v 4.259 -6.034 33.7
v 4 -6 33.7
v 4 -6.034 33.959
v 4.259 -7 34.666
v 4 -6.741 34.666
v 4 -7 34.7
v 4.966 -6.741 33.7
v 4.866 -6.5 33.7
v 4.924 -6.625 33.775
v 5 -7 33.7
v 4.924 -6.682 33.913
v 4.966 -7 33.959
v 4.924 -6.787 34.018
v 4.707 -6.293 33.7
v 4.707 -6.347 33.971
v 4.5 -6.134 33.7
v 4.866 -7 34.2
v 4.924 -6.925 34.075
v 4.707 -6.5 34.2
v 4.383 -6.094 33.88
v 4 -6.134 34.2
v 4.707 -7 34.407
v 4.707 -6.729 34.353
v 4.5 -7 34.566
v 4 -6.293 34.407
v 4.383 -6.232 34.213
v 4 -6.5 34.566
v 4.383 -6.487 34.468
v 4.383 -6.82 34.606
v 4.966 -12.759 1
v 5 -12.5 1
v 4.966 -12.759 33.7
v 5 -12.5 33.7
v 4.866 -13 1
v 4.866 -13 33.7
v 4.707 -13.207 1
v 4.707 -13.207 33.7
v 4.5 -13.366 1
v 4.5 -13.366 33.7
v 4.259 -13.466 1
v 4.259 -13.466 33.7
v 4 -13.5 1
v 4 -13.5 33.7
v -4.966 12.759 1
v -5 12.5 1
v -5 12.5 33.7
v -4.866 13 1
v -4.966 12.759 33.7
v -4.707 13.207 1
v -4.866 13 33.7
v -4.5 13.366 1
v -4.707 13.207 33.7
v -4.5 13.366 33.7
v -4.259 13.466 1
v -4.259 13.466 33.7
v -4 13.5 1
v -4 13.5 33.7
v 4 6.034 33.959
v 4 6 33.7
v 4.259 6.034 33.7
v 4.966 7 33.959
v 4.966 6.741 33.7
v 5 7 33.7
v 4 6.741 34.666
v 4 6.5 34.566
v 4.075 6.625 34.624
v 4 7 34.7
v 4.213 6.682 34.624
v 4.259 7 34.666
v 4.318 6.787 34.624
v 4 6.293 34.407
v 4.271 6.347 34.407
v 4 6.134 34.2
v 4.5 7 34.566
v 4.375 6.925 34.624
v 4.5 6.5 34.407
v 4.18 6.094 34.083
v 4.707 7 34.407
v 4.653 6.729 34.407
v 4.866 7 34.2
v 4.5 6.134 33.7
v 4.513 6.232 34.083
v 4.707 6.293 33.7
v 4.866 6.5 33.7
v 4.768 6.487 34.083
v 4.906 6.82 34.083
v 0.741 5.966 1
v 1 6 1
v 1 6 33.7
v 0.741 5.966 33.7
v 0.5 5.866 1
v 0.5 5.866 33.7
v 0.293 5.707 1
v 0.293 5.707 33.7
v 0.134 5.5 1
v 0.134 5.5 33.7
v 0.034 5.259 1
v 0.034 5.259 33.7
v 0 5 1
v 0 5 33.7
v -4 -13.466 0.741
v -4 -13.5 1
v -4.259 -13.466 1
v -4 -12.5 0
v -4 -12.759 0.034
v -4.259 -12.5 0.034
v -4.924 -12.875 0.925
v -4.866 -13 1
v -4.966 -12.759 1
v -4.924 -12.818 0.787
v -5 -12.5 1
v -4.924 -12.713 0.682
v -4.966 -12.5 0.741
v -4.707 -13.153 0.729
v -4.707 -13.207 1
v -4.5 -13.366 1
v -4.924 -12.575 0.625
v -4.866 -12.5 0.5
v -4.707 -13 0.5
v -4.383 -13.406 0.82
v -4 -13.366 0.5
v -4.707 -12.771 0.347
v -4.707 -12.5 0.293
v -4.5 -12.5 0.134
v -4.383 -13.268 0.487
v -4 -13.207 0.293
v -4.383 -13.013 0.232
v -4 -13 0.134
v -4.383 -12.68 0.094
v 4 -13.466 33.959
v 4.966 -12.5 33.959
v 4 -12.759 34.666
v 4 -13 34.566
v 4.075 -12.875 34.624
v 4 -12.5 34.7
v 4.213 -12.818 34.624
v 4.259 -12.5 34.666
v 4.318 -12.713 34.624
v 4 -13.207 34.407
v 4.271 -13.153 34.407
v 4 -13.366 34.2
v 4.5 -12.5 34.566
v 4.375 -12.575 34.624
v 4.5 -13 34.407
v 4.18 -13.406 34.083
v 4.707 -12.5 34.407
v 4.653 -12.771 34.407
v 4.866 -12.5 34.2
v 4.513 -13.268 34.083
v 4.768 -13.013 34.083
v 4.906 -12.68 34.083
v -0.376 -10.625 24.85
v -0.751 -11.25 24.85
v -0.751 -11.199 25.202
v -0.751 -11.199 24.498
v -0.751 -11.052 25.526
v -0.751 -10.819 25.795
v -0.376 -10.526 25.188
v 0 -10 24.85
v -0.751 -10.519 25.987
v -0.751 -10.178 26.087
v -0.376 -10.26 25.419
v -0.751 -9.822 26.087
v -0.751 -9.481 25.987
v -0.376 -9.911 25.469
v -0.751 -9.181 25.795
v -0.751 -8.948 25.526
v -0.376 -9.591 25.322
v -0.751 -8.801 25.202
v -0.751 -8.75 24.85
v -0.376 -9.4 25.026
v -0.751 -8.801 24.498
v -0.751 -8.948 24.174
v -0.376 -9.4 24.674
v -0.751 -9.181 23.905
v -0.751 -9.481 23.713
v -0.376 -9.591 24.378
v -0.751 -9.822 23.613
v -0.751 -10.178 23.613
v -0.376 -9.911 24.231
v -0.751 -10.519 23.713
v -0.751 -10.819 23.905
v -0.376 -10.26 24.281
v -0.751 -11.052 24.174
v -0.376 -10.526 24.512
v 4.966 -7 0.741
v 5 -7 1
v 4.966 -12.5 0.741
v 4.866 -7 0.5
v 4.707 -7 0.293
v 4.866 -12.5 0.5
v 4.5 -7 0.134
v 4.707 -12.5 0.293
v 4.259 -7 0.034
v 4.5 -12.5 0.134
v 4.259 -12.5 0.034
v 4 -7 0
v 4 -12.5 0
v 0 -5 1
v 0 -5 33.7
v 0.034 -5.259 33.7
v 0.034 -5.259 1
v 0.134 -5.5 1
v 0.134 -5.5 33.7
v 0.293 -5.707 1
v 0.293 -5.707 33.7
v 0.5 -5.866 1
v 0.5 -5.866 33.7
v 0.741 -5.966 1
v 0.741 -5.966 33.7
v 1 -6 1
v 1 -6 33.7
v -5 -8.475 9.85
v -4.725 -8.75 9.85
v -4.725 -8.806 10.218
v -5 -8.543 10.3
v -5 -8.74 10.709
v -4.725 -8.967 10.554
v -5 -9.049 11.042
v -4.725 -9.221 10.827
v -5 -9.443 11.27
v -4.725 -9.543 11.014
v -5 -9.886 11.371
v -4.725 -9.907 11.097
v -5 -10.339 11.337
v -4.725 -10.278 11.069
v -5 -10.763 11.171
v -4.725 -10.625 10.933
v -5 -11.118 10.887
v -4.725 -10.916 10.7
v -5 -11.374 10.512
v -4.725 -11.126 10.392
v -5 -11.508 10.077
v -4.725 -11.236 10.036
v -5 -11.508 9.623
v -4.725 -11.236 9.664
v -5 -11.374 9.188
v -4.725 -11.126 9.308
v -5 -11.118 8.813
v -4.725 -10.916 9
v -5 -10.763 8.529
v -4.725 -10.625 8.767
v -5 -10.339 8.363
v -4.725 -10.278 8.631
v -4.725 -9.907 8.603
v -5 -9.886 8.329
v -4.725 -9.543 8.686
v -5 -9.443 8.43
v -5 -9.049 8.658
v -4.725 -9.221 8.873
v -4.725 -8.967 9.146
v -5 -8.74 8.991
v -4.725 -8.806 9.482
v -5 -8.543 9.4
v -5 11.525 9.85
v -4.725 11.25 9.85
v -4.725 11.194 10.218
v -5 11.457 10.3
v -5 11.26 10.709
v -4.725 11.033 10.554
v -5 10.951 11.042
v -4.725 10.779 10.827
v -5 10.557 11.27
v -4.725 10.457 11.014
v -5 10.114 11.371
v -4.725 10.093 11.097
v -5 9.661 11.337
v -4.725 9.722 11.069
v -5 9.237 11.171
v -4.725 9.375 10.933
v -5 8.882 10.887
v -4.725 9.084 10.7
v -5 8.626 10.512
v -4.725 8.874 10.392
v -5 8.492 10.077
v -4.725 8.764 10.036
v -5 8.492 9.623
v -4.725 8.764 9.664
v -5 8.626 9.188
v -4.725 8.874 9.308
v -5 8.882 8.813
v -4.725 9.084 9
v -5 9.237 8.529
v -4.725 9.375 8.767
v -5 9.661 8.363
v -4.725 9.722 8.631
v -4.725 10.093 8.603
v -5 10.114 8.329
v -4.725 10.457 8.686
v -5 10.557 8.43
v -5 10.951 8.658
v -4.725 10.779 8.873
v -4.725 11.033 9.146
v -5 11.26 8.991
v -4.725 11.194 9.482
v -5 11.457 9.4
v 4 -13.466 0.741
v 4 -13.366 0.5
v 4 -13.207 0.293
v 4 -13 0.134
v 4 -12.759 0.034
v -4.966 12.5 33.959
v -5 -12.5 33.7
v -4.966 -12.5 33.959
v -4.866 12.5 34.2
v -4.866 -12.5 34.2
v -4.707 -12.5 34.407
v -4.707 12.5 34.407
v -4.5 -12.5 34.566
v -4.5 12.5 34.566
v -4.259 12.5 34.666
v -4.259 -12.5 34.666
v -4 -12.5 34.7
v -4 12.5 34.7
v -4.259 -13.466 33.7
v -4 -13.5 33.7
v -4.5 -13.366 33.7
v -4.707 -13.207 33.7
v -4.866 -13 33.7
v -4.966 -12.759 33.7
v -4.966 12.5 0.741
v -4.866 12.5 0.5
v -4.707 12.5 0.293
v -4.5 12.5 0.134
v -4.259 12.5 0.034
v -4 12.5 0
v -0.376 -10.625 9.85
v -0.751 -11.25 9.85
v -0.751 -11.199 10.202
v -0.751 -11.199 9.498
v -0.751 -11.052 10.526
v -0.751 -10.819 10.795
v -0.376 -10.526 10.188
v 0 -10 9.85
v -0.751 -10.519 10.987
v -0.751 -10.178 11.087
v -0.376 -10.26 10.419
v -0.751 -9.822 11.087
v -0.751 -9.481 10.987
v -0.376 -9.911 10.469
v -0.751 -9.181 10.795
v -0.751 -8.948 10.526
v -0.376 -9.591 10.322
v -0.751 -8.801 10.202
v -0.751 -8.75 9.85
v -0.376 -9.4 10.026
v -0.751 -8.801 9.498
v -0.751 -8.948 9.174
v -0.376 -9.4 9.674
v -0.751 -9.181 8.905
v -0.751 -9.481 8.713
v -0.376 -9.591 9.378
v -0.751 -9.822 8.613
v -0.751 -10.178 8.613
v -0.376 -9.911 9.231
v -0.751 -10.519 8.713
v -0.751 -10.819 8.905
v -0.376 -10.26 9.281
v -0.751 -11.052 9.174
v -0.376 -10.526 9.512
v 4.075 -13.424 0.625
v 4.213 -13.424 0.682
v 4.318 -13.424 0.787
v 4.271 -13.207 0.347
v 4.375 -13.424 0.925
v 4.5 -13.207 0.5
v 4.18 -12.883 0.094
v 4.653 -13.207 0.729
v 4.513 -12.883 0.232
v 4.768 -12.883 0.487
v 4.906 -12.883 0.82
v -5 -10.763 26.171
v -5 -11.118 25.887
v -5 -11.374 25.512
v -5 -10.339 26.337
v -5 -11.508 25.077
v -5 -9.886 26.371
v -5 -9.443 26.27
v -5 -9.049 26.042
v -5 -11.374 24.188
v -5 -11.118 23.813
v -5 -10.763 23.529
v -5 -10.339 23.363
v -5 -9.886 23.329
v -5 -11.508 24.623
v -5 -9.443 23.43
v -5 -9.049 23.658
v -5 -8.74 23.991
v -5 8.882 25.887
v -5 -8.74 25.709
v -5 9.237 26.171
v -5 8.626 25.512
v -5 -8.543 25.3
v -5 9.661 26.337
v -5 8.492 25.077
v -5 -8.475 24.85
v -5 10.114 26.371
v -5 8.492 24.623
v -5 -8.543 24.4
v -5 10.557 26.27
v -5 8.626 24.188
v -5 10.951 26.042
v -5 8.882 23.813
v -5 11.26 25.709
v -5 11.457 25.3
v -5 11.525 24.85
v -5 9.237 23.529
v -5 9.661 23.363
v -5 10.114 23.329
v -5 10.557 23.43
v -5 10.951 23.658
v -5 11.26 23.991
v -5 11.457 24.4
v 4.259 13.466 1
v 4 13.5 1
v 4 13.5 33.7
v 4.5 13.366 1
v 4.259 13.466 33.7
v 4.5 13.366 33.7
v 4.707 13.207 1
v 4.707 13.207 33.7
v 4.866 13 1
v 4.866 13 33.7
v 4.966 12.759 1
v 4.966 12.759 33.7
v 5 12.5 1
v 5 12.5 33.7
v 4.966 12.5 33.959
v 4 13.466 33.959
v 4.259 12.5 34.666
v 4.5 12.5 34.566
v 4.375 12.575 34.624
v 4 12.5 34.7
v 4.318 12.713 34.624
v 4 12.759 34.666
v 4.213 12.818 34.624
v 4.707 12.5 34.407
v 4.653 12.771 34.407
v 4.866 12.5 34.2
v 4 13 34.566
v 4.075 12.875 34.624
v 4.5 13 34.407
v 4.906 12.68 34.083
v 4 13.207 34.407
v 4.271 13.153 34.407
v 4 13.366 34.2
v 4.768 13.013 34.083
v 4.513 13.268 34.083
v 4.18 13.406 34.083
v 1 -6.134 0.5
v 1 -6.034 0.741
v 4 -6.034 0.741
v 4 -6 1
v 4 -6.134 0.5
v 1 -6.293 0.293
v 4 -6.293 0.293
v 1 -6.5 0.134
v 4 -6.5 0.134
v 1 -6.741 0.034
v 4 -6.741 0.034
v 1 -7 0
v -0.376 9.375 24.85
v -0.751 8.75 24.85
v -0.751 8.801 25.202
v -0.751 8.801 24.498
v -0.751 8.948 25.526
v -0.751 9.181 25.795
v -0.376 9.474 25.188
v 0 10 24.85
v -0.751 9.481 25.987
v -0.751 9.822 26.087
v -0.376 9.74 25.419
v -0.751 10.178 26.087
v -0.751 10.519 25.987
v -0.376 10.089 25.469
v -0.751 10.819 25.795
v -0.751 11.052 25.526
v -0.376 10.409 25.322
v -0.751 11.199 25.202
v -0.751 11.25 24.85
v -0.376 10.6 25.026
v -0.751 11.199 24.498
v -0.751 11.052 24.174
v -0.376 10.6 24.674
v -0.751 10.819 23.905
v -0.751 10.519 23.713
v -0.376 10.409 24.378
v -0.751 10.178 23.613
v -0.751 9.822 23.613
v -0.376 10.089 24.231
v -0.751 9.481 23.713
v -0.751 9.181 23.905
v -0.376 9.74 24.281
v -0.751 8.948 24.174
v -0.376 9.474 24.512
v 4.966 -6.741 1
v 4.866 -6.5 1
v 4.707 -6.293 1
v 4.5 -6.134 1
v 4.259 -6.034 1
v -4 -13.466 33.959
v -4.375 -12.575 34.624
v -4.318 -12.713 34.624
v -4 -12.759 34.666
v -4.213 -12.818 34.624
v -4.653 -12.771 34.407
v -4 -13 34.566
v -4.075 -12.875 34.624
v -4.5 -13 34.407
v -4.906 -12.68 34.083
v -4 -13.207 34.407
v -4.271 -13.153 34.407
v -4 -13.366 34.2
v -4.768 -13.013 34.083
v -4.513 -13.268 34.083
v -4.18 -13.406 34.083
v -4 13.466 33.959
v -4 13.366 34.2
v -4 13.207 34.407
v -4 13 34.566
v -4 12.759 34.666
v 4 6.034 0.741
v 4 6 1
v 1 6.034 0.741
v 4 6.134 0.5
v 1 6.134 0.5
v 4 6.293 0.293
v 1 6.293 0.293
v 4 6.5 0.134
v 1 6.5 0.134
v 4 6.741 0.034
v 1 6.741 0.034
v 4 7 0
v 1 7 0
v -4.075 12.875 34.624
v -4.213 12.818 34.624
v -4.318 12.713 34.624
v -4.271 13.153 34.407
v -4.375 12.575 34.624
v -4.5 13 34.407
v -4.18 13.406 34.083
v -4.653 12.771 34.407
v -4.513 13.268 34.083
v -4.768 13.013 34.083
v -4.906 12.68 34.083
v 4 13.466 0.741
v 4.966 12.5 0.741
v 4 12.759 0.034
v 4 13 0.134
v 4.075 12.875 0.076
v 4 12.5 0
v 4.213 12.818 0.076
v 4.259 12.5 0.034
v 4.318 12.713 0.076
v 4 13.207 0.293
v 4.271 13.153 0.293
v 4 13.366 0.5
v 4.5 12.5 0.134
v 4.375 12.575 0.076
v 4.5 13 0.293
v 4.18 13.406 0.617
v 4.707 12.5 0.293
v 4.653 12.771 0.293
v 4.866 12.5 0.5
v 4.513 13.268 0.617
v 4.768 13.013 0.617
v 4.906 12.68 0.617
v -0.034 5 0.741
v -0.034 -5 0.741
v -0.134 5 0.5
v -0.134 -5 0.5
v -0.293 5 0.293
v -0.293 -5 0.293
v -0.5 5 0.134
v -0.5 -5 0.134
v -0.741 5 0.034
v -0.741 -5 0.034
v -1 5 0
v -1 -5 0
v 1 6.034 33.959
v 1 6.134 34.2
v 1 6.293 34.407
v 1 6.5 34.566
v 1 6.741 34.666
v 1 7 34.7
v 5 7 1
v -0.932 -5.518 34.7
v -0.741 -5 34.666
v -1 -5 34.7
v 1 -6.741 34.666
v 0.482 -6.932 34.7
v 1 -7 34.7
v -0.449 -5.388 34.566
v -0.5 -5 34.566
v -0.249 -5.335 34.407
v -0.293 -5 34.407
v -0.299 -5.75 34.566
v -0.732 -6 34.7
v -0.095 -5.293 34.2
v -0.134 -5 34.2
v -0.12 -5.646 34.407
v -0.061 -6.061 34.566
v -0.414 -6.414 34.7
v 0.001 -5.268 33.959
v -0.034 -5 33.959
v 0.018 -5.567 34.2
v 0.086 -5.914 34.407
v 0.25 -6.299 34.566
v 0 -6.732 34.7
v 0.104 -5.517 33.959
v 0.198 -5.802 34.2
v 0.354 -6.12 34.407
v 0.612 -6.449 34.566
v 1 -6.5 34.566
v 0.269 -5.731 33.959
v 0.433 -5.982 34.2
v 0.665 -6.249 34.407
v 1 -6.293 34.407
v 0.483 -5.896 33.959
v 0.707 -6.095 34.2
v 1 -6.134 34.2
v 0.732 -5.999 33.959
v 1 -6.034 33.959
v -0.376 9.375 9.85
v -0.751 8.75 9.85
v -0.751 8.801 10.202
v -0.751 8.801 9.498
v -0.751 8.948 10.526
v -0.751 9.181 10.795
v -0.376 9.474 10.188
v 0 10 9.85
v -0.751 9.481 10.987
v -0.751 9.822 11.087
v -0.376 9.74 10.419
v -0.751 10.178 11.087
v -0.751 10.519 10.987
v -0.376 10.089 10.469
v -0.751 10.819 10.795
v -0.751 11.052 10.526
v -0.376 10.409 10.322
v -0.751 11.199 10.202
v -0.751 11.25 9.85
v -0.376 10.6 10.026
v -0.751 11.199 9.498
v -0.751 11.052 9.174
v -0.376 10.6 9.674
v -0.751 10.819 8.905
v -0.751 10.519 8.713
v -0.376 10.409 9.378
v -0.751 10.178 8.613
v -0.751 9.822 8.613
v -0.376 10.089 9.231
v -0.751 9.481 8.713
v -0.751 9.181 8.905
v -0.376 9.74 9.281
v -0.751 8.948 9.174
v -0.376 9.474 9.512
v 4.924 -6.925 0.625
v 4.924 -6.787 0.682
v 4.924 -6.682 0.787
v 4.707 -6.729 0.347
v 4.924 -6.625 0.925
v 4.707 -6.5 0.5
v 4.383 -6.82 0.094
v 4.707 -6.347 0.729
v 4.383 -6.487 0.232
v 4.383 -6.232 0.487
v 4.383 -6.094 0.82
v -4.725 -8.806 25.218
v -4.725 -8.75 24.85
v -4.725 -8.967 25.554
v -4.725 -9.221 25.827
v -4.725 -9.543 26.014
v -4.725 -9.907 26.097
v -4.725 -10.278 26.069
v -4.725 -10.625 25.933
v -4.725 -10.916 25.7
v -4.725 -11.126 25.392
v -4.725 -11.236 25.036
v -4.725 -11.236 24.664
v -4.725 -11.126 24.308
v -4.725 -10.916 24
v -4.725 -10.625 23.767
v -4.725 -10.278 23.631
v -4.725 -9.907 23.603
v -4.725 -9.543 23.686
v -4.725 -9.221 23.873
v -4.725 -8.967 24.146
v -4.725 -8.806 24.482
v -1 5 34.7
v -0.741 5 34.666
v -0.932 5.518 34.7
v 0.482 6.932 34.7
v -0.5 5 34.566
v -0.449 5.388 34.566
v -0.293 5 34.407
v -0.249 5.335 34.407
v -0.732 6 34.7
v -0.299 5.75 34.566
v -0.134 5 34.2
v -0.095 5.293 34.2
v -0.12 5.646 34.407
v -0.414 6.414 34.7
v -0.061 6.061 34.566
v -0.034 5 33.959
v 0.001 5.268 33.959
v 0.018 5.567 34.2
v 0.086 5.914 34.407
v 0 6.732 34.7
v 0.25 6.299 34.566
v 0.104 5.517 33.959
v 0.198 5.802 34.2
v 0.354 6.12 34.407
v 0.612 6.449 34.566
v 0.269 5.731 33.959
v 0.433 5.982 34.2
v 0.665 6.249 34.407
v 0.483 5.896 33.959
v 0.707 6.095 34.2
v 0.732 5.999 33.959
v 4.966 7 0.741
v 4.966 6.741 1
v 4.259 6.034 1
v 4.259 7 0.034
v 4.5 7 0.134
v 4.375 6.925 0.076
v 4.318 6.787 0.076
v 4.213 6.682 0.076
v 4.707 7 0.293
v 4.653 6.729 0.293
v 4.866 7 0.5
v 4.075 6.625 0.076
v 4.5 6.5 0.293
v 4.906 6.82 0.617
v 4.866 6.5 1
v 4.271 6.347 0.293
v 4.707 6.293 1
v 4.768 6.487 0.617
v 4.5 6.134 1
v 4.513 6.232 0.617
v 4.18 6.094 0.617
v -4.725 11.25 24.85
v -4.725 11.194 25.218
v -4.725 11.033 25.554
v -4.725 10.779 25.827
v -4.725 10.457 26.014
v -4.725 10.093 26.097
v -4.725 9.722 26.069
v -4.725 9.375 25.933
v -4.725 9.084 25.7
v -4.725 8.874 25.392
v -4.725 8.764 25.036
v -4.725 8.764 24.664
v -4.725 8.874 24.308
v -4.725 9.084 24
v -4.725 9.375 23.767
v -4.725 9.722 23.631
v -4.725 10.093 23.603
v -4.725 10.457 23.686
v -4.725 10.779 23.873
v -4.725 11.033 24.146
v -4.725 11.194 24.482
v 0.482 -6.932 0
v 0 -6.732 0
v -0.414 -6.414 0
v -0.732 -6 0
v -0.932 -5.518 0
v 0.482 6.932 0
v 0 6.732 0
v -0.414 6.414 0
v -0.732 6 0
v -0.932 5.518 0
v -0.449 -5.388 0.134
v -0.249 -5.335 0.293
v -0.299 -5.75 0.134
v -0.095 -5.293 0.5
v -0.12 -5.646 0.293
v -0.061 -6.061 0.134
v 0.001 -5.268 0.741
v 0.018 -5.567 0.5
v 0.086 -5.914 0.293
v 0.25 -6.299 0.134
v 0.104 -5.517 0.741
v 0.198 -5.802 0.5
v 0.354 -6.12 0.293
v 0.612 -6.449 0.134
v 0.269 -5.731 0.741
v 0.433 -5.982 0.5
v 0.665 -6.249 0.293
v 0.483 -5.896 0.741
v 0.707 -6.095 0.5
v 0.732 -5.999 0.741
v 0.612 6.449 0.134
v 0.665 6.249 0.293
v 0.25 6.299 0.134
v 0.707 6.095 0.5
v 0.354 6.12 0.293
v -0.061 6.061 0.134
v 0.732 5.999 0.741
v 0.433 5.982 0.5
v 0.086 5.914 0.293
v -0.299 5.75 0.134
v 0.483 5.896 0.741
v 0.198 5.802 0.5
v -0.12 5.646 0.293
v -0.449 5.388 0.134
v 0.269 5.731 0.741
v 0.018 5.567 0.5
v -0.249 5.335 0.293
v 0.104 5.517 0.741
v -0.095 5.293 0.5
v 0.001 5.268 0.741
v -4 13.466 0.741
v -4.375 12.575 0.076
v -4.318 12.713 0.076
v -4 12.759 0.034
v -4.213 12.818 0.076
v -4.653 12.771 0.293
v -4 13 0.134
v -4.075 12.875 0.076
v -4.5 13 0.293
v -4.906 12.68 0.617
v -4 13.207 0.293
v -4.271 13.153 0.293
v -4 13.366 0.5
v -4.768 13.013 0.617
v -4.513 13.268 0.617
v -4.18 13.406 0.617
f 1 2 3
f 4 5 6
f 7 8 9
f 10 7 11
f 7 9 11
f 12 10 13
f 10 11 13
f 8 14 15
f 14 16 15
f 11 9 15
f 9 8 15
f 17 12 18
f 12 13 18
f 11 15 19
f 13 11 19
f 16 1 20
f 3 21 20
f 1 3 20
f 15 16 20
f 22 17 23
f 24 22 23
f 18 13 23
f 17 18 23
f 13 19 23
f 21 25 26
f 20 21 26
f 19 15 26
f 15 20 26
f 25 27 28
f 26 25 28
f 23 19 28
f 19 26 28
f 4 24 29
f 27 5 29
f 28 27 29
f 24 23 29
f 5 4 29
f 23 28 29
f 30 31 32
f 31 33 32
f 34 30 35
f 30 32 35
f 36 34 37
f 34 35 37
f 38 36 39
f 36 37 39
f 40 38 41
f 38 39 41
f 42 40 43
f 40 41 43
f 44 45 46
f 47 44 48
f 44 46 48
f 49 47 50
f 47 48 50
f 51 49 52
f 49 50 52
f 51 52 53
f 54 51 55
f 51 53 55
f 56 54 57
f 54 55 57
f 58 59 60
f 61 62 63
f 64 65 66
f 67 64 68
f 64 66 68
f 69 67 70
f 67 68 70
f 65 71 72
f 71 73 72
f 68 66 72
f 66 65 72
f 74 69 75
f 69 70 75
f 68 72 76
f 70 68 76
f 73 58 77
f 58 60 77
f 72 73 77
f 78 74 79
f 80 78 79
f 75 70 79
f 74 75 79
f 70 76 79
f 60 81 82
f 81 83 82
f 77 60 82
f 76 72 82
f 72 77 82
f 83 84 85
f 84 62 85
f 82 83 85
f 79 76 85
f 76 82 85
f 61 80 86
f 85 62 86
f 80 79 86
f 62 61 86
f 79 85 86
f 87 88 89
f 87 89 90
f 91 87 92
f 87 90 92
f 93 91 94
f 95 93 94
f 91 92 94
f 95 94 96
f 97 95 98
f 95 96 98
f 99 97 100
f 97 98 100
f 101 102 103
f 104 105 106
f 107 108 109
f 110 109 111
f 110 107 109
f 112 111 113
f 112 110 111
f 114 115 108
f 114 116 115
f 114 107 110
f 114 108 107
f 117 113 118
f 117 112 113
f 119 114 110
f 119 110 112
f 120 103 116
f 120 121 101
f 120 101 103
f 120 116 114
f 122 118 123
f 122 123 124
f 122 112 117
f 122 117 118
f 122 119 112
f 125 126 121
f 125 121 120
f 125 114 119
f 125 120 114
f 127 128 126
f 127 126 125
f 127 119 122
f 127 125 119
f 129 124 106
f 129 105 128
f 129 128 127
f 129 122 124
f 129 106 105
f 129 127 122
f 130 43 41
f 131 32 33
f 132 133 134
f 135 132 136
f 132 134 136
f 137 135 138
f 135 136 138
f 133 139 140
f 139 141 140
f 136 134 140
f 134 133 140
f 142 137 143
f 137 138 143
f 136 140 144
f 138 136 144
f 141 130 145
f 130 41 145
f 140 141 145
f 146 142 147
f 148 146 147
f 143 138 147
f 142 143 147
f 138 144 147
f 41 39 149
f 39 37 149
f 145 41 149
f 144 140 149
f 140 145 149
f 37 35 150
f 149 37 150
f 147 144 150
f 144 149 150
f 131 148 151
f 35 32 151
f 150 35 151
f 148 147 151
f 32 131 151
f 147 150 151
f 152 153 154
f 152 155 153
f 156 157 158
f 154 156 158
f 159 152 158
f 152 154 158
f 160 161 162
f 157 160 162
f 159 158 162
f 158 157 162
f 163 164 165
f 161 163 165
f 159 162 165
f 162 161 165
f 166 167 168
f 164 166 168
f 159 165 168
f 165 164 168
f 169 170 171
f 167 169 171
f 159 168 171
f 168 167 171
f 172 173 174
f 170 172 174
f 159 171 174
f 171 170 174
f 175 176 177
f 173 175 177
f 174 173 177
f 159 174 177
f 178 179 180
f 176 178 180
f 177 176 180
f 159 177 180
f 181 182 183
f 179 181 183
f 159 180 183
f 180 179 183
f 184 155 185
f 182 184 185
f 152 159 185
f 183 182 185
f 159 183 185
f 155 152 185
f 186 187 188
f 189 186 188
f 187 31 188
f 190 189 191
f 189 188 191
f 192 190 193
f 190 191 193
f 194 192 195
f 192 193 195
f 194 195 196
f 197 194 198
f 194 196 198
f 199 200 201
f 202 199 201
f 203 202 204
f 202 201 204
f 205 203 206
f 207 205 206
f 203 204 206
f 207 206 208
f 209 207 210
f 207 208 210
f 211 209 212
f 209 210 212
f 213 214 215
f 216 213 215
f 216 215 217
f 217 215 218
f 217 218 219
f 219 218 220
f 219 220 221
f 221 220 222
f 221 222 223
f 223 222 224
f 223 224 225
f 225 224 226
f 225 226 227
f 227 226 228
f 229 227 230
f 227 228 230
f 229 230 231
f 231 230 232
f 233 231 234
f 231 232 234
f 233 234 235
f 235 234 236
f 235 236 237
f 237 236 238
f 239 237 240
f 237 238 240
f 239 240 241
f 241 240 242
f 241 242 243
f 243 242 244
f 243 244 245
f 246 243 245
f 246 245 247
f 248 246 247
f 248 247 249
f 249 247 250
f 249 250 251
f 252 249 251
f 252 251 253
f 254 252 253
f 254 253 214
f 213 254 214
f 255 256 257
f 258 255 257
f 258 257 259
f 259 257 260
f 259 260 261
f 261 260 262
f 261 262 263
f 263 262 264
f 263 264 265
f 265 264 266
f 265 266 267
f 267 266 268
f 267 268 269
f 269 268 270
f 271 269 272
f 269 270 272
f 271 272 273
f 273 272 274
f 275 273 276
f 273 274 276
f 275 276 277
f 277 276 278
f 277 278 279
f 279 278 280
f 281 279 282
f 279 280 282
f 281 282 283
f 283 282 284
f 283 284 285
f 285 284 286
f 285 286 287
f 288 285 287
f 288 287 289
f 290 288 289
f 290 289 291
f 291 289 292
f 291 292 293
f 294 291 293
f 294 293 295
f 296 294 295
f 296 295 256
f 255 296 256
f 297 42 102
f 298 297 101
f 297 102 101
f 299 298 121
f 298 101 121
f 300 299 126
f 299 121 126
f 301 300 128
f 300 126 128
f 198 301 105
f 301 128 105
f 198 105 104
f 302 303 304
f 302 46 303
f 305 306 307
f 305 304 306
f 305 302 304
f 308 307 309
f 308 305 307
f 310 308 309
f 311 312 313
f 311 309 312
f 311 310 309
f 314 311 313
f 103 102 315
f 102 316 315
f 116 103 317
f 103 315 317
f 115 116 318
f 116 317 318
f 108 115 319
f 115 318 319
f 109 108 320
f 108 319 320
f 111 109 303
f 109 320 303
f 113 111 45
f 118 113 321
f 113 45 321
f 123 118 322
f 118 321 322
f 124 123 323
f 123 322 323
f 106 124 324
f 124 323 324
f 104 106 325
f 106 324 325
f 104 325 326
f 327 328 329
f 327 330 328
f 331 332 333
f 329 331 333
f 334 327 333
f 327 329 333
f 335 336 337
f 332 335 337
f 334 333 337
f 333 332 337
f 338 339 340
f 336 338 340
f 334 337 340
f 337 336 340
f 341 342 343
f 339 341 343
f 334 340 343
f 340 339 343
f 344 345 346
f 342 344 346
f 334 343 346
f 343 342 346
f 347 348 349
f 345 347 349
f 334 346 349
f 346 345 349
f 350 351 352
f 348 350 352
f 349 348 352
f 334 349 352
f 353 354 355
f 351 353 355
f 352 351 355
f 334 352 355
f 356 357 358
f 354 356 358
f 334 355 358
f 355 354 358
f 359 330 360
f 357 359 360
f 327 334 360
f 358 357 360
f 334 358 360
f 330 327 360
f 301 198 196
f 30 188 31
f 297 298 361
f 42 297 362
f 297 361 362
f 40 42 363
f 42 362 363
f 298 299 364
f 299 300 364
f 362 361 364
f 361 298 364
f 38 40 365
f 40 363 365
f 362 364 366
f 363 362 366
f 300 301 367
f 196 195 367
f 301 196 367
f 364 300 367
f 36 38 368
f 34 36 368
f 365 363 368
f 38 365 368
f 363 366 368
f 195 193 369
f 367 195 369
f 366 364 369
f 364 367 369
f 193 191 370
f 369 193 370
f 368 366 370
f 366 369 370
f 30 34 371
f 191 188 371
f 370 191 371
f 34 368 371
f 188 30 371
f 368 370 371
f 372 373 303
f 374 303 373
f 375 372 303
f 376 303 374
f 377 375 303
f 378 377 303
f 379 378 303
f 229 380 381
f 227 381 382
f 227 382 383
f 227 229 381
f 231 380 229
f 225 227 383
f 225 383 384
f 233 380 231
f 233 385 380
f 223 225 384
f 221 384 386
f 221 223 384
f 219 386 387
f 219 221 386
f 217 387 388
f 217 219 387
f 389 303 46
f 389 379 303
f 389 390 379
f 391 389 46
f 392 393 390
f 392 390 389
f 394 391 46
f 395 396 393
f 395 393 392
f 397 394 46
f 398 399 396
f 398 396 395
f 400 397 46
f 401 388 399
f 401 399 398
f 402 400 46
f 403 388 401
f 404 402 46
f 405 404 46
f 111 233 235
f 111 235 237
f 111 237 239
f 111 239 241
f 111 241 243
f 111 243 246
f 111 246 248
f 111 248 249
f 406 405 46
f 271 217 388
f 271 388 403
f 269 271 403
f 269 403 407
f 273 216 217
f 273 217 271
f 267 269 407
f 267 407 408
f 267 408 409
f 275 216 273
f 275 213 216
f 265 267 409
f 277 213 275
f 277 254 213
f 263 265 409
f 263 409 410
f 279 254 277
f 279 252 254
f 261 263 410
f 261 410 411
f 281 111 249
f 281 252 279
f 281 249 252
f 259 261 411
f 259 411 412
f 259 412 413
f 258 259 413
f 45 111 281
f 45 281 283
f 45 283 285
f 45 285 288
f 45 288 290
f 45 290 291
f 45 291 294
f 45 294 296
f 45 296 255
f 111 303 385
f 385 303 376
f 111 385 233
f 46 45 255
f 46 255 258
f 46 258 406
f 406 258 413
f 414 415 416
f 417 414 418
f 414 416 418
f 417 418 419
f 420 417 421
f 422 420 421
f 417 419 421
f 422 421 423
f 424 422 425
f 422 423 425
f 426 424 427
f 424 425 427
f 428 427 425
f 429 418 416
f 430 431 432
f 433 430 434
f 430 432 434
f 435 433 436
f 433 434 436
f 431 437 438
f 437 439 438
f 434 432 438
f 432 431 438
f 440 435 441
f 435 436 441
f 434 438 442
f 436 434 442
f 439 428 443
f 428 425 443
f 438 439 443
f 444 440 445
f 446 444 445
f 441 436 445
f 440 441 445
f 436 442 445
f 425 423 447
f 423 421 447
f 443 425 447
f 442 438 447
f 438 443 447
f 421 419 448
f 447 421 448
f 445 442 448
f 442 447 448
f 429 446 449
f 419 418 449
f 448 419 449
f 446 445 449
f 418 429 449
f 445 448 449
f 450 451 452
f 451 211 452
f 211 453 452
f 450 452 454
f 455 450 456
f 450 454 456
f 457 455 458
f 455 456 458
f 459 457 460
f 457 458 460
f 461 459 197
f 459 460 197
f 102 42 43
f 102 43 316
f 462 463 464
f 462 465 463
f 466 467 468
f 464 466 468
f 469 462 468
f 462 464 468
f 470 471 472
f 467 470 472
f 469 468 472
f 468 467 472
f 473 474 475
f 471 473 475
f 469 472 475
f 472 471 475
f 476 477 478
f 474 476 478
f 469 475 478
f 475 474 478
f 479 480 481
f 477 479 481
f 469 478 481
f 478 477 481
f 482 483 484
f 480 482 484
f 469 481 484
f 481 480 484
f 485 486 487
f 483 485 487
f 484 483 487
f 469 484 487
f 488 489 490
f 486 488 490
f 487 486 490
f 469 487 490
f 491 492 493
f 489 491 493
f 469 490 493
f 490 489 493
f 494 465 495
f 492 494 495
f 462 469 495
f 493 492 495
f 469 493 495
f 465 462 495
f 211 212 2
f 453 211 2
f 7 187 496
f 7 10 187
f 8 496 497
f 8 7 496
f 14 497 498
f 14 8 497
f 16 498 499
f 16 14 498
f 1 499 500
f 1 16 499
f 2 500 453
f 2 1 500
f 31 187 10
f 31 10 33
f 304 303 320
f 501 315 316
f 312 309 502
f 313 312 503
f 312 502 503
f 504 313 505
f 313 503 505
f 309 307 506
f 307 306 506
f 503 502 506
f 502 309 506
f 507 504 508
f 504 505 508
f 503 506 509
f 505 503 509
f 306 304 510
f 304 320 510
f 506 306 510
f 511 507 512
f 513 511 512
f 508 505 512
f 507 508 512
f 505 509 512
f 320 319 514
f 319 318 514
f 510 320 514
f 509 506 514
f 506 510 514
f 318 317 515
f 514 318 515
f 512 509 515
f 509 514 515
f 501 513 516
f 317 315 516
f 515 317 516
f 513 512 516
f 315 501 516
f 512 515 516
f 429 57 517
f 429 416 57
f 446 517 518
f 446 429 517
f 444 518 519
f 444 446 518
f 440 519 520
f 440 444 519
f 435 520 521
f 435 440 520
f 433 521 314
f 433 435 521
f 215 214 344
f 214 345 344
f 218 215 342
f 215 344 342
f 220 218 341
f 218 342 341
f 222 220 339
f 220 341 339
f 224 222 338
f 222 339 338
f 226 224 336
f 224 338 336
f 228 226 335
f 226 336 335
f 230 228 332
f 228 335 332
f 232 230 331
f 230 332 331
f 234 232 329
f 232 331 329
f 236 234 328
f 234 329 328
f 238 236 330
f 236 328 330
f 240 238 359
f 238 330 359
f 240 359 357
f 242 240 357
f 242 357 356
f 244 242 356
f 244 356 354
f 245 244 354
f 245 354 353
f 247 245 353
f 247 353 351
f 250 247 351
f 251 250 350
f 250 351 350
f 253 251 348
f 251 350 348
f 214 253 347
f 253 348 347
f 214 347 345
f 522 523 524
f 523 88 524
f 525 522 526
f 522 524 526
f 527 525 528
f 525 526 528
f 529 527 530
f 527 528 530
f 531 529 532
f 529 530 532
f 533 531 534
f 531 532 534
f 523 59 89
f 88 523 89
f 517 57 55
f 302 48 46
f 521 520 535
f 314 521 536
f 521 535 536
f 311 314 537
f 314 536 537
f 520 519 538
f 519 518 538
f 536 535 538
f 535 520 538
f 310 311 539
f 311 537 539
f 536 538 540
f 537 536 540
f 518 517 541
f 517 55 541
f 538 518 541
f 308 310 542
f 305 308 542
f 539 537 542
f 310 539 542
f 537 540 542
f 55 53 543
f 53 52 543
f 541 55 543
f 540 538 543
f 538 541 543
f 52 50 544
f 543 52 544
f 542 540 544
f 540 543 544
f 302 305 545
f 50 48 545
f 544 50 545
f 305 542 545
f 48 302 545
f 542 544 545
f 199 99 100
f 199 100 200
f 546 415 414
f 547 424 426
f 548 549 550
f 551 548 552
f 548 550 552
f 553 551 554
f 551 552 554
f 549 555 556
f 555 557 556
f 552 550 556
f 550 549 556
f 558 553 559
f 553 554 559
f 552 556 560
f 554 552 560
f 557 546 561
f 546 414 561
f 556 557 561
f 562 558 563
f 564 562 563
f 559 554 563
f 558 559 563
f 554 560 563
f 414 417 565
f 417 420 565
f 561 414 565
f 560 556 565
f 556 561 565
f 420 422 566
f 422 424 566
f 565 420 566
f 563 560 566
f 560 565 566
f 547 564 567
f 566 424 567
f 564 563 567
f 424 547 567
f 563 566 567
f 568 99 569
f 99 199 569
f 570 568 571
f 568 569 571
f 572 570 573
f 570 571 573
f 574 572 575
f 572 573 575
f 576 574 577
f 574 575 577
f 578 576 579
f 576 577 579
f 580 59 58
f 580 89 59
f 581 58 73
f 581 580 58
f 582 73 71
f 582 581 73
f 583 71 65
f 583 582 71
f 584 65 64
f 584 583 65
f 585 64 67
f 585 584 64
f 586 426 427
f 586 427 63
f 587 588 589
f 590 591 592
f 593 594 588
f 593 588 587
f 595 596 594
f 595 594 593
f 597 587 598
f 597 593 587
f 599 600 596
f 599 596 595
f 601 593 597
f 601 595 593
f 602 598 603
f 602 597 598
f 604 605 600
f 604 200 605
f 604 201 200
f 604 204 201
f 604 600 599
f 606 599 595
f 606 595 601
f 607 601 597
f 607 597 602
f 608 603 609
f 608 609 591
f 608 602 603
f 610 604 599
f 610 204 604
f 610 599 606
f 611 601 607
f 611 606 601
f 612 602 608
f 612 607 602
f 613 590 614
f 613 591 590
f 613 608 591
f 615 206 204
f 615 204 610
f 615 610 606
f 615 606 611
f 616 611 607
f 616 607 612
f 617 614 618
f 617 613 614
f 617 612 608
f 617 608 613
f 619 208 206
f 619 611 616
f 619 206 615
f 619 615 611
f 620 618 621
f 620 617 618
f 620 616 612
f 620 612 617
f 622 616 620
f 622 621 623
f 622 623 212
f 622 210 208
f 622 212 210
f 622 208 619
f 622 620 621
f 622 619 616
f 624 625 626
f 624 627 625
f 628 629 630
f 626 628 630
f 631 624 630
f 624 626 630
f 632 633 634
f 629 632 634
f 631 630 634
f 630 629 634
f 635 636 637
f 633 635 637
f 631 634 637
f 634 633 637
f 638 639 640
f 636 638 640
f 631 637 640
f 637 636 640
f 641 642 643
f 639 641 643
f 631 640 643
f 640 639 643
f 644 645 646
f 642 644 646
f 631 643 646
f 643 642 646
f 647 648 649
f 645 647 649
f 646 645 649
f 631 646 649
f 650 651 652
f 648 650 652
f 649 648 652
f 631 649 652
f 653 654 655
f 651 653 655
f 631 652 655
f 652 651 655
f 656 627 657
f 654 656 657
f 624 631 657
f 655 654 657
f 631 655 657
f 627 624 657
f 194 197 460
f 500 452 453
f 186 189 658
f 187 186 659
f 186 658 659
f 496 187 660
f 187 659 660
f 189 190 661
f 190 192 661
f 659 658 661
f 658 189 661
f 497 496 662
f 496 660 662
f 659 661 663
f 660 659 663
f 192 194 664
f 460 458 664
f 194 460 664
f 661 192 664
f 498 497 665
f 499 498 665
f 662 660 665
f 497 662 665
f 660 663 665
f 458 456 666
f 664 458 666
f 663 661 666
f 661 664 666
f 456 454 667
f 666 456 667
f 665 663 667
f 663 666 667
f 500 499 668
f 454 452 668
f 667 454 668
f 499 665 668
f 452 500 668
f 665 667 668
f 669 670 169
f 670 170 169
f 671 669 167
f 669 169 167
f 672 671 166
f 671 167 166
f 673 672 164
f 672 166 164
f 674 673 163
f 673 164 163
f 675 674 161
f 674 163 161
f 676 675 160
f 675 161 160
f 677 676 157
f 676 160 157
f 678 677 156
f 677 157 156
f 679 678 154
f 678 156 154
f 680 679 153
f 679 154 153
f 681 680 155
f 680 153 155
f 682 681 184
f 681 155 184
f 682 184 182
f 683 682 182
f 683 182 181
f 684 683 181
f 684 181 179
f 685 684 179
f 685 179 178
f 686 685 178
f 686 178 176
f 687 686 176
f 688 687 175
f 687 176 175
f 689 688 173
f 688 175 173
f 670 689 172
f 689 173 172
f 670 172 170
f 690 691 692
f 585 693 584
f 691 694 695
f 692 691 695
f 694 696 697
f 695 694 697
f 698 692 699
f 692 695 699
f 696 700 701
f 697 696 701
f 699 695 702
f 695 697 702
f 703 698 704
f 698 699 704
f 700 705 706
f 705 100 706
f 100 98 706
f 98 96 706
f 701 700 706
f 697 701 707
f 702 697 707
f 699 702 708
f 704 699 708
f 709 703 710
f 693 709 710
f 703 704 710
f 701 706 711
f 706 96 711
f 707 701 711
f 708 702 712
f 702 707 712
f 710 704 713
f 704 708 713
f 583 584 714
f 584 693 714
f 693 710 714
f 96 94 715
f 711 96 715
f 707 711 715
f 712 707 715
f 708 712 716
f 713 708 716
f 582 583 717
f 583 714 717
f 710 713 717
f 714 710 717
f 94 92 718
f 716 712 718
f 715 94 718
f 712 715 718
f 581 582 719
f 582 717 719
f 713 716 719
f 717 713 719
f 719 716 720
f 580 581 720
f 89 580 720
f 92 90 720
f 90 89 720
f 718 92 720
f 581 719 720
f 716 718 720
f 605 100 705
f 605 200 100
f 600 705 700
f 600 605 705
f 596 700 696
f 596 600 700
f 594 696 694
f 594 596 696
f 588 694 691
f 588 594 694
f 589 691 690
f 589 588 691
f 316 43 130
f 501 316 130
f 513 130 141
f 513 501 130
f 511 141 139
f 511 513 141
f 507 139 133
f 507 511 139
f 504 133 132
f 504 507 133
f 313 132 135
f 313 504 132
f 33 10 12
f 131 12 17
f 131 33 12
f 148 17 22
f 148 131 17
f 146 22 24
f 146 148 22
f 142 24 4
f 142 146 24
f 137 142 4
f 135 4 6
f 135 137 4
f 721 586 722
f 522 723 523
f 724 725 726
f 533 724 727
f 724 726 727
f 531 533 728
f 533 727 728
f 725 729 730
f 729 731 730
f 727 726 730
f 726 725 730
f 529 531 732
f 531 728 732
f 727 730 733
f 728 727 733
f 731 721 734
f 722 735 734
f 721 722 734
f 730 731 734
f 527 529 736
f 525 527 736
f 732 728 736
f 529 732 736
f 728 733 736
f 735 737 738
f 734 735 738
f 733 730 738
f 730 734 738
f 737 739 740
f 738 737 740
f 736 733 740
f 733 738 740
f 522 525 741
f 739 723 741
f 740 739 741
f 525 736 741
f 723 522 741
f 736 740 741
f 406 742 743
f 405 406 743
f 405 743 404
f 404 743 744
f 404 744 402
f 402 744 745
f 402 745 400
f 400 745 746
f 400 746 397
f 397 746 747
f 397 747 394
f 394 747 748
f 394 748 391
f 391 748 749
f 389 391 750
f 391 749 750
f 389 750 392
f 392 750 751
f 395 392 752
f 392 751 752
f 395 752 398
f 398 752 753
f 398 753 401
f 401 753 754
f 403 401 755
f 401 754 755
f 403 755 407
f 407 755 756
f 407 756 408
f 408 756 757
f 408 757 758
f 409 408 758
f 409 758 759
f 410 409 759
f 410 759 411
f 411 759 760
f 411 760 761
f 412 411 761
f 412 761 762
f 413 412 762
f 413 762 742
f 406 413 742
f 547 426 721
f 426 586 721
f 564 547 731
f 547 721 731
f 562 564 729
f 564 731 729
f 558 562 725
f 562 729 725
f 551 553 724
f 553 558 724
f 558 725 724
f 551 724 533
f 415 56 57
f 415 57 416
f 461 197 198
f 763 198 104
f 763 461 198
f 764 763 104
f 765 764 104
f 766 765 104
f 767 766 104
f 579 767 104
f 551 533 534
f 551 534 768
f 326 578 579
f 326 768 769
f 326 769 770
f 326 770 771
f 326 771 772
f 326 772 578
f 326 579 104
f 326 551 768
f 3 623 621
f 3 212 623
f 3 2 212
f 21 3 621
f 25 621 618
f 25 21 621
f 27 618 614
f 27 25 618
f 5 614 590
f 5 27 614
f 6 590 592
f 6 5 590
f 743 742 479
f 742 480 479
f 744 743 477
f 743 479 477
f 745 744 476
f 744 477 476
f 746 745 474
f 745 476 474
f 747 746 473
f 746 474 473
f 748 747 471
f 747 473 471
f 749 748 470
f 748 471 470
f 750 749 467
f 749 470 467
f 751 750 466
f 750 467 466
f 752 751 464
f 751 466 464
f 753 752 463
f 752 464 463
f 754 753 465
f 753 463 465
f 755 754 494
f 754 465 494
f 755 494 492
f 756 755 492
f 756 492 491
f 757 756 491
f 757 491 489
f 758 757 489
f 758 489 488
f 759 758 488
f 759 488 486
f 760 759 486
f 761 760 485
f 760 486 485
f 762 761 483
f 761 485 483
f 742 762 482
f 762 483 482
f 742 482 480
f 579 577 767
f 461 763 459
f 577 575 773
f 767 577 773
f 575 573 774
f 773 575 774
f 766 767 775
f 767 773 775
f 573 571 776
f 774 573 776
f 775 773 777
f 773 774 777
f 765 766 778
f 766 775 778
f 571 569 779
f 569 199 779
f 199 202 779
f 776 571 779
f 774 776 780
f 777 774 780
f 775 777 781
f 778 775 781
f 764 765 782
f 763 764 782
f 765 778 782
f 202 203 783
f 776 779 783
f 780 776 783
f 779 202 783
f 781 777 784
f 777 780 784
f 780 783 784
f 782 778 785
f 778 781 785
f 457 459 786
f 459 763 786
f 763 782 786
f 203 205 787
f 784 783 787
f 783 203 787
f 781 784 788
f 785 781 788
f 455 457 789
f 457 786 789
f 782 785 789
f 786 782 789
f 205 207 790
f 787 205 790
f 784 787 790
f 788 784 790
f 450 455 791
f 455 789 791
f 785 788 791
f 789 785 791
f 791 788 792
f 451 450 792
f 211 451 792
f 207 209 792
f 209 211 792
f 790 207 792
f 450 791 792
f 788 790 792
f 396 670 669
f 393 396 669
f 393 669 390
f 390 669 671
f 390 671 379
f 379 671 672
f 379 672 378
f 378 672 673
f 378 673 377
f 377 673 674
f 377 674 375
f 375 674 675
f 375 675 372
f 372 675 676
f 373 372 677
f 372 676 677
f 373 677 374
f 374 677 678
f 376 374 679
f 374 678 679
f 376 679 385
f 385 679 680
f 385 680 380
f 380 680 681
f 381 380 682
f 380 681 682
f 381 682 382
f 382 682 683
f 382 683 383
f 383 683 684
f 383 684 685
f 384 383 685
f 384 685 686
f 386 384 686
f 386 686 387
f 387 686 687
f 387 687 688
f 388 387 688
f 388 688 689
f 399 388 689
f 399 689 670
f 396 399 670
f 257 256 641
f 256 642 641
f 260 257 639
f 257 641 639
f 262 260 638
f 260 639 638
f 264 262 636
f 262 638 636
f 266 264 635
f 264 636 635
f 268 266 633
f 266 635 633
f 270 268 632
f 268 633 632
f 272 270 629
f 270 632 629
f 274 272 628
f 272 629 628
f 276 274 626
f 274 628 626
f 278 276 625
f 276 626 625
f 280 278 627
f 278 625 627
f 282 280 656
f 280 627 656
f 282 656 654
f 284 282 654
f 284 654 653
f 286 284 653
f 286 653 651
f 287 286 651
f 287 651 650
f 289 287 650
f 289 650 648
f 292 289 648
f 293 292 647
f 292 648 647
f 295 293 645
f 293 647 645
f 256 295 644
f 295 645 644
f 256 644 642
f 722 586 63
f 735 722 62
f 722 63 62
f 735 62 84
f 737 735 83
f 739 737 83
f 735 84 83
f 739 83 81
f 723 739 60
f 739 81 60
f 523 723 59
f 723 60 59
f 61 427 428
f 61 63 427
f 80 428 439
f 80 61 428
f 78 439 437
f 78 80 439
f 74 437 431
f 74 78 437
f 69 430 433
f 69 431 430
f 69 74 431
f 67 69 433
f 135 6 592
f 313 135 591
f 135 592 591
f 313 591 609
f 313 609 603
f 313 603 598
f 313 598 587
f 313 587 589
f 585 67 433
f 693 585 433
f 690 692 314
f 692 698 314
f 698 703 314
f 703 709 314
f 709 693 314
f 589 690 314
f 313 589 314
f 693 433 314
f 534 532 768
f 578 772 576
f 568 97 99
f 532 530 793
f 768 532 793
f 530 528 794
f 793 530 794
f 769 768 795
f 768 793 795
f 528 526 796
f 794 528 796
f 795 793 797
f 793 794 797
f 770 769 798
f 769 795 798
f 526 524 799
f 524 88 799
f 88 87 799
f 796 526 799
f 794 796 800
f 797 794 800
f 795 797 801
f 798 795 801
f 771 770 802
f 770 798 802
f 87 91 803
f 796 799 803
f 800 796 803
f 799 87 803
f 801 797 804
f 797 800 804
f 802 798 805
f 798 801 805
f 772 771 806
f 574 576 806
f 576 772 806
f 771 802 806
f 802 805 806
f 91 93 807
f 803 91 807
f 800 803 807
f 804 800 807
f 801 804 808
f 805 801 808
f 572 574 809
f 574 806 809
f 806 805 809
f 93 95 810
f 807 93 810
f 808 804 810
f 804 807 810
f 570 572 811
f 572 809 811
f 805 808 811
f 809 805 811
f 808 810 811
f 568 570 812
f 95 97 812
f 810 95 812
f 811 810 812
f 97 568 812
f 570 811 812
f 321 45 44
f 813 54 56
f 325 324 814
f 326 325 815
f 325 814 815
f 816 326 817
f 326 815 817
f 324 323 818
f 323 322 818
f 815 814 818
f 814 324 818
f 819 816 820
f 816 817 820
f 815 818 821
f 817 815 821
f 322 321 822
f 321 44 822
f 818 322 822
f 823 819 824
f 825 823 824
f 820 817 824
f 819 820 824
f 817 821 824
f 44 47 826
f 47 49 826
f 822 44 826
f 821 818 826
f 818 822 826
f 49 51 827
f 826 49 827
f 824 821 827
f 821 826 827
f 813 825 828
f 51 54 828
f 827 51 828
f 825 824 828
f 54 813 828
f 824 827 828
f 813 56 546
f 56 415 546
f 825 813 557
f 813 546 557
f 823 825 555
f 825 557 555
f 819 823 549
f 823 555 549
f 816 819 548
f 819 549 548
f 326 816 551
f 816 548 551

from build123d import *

# Parameters (mm, degrees)
BOSS_EXTRUDE1_DEPTH         = 34.7
FILLET1_R                   = 1
M3_TAPPED_HOLE2_D           = 2.5
M3_TAPPED_HOLE2_DEPTH       = 4.248924226
M3_TAPPED_HOLE2_CSINK_D     = 3.05
M3_TAPPED_HOLE2_CSINK_ANGLE = 90
M3_TAPPED_HOLE2_TIP         = 0.751075774


with BuildPart() as part:
    # Sketch1 → Boss-Extrude1 (new body)
    with BuildSketch(Plane.XY):
        Polygon((5, -6), (5, -13.5), (-5, -13.5), (-5, 13.5), (5, 13.5), (5, 6), (0, 6), (0, -6), align=None)
    extrude(amount=BOSS_EXTRUDE1_DEPTH)

    # Fillet1
    fillet1_edges = [part.edges().sort_by_distance(p)[0] for p in [
        (0, 0, 0),
        (2.5, -6, 0),
        (5, -9.75, 0),
        (0, -13.5, 0),
        (2.5, -6, 34.7),
        (-5, -13.5, 17.35),
        (-5, 13.5, 17.35),
        (5, 13.5, 17.35),
        (5, 6, 17.35),
        (0, 6, 17.35),
        (0, -6, 17.35),
        (5, -6, 17.35),
        (5, -13.5, 17.35),
        (0, 0, 34.7),
        (2.5, 6, 34.7),
        (5, 9.75, 34.7),
        (0, 13.5, 34.7),
        (-5, 0, 34.7),
        (0, -13.5, 34.7),
        (-5, 0, 0),
        (5, -9.75, 34.7),
        (0, 13.5, 0),
        (5, 9.75, 0),
        (2.5, 6, 0),
    ]]
    fillet(fillet1_edges, radius=FILLET1_R)

    # M3 Tapped Hole2
    with Locations(Plane(origin=(-5, 10, 9.85), x_dir=(0, -1, 0), z_dir=(-1, 0, 0))):
        with Locations((0, 0), (0, 15), (20, 15), (20, 0)):
            CounterSinkHole(M3_TAPPED_HOLE2_D / 2, M3_TAPPED_HOLE2_CSINK_D / 2, depth=M3_TAPPED_HOLE2_DEPTH, counter_sink_angle=M3_TAPPED_HOLE2_CSINK_ANGLE)
            with Locations((0, 0, -(M3_TAPPED_HOLE2_DEPTH + M3_TAPPED_HOLE2_TIP / 2))):  # 118° drill point
                Cone(0, M3_TAPPED_HOLE2_D / 2, M3_TAPPED_HOLE2_TIP, mode=Mode.SUBTRACT)


solid = part.part
